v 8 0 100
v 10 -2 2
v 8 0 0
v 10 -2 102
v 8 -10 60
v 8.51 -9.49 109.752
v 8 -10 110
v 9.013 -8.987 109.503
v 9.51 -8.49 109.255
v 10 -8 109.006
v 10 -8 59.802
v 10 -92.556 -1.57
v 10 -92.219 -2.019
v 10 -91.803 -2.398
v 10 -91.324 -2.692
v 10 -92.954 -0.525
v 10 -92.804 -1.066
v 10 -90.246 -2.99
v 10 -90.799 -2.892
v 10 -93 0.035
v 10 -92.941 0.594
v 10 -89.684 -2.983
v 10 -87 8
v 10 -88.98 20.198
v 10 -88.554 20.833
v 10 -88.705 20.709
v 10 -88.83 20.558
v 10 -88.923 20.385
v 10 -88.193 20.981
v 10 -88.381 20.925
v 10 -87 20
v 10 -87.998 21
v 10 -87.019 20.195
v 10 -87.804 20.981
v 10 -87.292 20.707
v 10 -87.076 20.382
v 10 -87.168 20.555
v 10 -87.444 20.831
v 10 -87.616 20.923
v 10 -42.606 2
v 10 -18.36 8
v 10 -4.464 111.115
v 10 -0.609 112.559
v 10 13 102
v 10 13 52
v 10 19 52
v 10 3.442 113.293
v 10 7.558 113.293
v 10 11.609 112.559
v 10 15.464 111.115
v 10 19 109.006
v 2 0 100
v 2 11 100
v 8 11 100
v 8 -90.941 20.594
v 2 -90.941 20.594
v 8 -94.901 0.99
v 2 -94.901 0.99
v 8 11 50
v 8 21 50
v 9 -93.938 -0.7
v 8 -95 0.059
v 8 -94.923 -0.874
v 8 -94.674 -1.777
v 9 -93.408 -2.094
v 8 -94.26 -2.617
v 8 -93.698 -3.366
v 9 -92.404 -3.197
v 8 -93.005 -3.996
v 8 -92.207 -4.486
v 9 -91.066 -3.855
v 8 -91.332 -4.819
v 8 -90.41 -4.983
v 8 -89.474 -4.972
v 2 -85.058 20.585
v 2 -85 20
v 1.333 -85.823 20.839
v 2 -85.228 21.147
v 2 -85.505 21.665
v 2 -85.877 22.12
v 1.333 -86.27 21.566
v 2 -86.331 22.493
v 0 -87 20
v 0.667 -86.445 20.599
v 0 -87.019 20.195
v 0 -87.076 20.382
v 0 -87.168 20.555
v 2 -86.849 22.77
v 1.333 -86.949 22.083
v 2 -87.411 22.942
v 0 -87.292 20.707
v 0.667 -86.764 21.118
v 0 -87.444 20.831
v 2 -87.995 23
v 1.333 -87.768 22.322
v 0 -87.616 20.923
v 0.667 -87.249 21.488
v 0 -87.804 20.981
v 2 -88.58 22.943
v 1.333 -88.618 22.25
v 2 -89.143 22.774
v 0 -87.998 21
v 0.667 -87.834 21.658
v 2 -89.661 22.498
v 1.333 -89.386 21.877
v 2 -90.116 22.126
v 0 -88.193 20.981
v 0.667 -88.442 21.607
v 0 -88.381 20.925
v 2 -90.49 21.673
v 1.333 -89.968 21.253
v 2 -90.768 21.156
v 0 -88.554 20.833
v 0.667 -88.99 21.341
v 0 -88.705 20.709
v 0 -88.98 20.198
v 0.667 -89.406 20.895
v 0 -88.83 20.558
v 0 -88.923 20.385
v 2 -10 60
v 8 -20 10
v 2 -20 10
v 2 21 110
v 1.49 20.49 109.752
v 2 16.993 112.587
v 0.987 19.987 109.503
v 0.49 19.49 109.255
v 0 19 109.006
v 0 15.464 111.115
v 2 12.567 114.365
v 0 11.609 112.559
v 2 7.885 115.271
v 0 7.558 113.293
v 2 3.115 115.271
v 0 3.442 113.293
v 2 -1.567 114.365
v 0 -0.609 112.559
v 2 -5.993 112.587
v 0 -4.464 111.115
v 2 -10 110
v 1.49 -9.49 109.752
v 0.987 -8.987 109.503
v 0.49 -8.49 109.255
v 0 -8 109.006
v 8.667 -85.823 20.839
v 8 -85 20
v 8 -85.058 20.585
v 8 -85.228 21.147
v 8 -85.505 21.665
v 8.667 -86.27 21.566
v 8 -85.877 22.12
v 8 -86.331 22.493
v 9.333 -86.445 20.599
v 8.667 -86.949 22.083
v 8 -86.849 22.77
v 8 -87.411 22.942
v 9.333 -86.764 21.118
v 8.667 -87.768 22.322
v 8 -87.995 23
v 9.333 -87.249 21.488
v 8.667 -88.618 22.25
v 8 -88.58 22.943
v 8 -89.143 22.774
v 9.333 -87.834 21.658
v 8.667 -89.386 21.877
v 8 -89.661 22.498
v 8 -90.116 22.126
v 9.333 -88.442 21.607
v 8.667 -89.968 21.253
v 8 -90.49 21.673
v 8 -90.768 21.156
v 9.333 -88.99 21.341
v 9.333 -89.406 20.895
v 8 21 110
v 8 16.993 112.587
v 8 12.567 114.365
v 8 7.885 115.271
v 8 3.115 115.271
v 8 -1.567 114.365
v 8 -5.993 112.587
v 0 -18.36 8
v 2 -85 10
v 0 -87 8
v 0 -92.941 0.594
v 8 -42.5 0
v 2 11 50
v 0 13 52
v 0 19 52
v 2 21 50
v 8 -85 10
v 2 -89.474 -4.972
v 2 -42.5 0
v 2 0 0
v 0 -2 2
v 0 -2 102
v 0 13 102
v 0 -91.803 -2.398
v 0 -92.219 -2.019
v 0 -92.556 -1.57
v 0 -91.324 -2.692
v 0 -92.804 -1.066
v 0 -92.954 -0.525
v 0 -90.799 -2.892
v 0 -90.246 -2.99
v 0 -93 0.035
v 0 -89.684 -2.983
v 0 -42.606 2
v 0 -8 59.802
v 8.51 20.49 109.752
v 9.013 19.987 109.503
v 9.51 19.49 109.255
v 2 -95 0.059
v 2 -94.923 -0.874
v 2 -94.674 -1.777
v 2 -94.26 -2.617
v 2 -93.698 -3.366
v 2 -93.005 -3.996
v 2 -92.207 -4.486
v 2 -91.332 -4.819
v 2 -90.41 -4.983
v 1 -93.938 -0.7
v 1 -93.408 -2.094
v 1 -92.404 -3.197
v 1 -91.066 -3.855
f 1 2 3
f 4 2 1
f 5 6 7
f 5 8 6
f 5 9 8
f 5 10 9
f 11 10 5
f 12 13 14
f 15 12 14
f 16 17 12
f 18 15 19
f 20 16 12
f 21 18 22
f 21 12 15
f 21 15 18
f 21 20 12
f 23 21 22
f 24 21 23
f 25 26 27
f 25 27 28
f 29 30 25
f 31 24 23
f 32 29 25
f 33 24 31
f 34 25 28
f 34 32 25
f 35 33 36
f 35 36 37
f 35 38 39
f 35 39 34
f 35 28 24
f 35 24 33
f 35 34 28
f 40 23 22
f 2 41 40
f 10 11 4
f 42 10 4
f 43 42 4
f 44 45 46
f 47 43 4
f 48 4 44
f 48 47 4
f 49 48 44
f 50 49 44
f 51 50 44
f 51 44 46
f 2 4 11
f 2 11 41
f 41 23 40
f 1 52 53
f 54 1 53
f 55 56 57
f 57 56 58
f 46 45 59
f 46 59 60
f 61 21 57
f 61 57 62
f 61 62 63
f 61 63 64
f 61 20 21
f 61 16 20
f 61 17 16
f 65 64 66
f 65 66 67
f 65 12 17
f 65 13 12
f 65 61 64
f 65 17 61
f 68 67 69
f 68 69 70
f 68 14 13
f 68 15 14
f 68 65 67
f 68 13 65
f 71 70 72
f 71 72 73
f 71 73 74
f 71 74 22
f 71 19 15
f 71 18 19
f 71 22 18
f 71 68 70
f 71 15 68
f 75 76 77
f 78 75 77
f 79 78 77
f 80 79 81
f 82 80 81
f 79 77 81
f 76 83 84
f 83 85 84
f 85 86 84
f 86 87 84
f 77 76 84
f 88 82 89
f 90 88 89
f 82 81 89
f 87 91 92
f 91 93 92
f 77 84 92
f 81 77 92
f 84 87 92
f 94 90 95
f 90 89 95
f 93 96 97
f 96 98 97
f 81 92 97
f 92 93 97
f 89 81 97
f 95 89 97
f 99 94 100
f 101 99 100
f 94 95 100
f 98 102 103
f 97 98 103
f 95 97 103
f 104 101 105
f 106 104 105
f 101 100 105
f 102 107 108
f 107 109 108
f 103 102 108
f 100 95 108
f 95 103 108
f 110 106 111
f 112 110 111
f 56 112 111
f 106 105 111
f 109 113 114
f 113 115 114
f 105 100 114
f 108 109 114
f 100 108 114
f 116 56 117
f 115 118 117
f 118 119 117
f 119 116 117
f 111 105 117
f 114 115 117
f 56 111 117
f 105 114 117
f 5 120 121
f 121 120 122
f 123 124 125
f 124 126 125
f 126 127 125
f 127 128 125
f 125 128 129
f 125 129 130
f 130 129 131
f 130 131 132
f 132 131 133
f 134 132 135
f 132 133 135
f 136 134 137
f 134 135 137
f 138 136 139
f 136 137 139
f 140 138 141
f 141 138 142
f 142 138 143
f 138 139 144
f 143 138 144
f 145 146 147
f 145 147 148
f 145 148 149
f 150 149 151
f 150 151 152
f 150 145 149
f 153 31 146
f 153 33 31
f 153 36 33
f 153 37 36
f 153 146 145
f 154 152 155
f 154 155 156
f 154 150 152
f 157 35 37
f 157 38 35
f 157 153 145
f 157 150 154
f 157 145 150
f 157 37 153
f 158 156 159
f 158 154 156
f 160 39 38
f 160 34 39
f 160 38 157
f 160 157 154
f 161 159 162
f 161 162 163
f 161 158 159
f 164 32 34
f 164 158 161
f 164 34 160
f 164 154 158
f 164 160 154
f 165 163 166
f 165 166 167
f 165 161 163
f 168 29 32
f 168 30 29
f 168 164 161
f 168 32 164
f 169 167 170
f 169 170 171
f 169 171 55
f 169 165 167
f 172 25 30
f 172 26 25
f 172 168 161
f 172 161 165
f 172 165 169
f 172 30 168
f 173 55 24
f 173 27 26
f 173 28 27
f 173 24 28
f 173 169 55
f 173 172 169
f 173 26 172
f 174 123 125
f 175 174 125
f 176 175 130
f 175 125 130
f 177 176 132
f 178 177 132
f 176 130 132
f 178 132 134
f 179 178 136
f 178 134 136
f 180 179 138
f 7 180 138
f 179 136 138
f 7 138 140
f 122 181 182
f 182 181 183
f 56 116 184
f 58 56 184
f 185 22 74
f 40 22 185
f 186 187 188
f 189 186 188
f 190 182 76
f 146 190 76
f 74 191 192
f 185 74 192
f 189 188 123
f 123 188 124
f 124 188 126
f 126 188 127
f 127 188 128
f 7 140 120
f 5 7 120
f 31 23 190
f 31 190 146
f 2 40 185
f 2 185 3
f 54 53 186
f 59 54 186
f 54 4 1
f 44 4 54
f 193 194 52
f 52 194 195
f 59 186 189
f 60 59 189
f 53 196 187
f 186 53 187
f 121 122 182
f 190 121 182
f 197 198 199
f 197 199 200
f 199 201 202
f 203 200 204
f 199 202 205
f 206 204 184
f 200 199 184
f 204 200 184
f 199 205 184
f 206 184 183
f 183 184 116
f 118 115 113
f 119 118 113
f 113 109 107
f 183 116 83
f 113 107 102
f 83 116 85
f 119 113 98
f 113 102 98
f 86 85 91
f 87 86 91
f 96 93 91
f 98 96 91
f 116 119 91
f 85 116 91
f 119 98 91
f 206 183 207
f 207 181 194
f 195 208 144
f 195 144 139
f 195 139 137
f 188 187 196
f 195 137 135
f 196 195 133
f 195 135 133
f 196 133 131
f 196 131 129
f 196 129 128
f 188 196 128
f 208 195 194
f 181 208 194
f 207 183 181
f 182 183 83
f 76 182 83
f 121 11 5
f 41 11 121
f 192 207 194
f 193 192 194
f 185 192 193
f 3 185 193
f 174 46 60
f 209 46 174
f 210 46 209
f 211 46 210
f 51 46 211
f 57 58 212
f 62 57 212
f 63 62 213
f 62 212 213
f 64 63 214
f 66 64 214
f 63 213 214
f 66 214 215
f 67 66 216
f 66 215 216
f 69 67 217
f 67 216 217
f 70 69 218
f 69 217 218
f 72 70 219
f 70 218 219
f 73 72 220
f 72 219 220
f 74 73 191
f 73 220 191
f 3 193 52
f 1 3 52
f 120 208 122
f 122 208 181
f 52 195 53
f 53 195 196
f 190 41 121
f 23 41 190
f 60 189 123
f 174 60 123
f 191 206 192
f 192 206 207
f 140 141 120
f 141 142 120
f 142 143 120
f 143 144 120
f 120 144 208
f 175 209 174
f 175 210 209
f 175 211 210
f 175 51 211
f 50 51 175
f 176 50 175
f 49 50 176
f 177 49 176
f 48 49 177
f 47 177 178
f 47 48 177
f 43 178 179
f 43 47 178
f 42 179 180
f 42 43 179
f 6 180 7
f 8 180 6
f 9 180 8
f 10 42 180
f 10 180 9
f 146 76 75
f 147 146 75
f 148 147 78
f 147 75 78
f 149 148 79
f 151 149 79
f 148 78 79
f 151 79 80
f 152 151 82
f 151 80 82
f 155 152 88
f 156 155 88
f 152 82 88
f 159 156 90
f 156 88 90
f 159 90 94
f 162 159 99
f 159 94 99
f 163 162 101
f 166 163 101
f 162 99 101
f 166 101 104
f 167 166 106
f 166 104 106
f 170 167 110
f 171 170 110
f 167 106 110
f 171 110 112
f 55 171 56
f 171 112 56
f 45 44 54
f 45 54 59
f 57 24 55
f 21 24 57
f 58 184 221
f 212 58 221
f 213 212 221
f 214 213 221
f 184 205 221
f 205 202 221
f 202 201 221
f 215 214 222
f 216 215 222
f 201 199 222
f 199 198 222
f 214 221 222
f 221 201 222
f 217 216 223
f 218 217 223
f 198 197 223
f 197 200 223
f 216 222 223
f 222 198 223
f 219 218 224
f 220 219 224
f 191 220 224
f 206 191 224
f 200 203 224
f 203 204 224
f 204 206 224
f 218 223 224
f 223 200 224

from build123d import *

# Parameters (mm, degrees)
F1_DEPTH = 10
F2_SIZE  = 2


with BuildPart() as f1:
    # F0 (on Right) → F1 (new body)
    with BuildSketch(Plane.YZ):
        with BuildLine():
            Line((-42.5, 0), (0, 0))
            Line((0, 0), (0, 100))
            Line((0, 100), (11, 100))
            Line((11, 100), (11, 50))
            Line((11, 50), (21, 50))
            Line((21, 50), (21, 110))
            ThreePointArc((21, 110), (5.5, 115.384955), (-10, 110))
            Line((-10, 110), (-10, 60))
            Line((-10, 60), (-20, 10))
            Line((-20, 10), (-85, 10))
            Line((-85, 10), (-85, 20))
            ThreePointArc((-85, 20), (-87.701489, 22.985112), (-90.940594, 20.594059))
            Line((-90.940594, 20.594059), (-94.90099, 0.990099))
            ThreePointArc((-94.90099, 0.990099), (-93.697535, -3.365745), (-89.473684, -4.972222))
            Line((-89.473684, -4.972222), (-42.5, 0))
        make_face()
    extrude(amount=F1_DEPTH)

    # F2
    f2_edges = [f1.edges().sort_by_distance(p)[0] for p in [
        (0, -93.697535, -3.365745),
        (0, -65.986842, -2.486111),
        (0, -21.25, 0),
        (0, 0, 50),
        (0, 5.5, 100),
        (0, 11, 75),
        (0, 16, 50),
        (0, 21, 80),
        (0, 5.5, 115.384955),
        (0, -10, 85),
        (0, -15, 35),
        (0, -52.5, 10),
        (0, -85, 15),
        (0, -87.701489, 22.985112),
        (0, -92.920792, 10.792079),
        (10, -93.697535, -3.365745),
        (10, -65.986842, -2.486111),
        (10, -21.25, 0),
        (10, 0, 50),
        (10, 5.5, 100),
        (10, 11, 75),
        (10, 16, 50),
        (10, 21, 80),
        (10, 5.5, 115.384955),
        (10, -10, 85),
        (10, -15, 35),
        (10, -52.5, 10),
        (10, -85, 15),
        (10, -87.701489, 22.985112),
        (10, -92.920792, 10.792079),
    ]]
    chamfer(f2_edges, length=F2_SIZE)


solid = f1.part
